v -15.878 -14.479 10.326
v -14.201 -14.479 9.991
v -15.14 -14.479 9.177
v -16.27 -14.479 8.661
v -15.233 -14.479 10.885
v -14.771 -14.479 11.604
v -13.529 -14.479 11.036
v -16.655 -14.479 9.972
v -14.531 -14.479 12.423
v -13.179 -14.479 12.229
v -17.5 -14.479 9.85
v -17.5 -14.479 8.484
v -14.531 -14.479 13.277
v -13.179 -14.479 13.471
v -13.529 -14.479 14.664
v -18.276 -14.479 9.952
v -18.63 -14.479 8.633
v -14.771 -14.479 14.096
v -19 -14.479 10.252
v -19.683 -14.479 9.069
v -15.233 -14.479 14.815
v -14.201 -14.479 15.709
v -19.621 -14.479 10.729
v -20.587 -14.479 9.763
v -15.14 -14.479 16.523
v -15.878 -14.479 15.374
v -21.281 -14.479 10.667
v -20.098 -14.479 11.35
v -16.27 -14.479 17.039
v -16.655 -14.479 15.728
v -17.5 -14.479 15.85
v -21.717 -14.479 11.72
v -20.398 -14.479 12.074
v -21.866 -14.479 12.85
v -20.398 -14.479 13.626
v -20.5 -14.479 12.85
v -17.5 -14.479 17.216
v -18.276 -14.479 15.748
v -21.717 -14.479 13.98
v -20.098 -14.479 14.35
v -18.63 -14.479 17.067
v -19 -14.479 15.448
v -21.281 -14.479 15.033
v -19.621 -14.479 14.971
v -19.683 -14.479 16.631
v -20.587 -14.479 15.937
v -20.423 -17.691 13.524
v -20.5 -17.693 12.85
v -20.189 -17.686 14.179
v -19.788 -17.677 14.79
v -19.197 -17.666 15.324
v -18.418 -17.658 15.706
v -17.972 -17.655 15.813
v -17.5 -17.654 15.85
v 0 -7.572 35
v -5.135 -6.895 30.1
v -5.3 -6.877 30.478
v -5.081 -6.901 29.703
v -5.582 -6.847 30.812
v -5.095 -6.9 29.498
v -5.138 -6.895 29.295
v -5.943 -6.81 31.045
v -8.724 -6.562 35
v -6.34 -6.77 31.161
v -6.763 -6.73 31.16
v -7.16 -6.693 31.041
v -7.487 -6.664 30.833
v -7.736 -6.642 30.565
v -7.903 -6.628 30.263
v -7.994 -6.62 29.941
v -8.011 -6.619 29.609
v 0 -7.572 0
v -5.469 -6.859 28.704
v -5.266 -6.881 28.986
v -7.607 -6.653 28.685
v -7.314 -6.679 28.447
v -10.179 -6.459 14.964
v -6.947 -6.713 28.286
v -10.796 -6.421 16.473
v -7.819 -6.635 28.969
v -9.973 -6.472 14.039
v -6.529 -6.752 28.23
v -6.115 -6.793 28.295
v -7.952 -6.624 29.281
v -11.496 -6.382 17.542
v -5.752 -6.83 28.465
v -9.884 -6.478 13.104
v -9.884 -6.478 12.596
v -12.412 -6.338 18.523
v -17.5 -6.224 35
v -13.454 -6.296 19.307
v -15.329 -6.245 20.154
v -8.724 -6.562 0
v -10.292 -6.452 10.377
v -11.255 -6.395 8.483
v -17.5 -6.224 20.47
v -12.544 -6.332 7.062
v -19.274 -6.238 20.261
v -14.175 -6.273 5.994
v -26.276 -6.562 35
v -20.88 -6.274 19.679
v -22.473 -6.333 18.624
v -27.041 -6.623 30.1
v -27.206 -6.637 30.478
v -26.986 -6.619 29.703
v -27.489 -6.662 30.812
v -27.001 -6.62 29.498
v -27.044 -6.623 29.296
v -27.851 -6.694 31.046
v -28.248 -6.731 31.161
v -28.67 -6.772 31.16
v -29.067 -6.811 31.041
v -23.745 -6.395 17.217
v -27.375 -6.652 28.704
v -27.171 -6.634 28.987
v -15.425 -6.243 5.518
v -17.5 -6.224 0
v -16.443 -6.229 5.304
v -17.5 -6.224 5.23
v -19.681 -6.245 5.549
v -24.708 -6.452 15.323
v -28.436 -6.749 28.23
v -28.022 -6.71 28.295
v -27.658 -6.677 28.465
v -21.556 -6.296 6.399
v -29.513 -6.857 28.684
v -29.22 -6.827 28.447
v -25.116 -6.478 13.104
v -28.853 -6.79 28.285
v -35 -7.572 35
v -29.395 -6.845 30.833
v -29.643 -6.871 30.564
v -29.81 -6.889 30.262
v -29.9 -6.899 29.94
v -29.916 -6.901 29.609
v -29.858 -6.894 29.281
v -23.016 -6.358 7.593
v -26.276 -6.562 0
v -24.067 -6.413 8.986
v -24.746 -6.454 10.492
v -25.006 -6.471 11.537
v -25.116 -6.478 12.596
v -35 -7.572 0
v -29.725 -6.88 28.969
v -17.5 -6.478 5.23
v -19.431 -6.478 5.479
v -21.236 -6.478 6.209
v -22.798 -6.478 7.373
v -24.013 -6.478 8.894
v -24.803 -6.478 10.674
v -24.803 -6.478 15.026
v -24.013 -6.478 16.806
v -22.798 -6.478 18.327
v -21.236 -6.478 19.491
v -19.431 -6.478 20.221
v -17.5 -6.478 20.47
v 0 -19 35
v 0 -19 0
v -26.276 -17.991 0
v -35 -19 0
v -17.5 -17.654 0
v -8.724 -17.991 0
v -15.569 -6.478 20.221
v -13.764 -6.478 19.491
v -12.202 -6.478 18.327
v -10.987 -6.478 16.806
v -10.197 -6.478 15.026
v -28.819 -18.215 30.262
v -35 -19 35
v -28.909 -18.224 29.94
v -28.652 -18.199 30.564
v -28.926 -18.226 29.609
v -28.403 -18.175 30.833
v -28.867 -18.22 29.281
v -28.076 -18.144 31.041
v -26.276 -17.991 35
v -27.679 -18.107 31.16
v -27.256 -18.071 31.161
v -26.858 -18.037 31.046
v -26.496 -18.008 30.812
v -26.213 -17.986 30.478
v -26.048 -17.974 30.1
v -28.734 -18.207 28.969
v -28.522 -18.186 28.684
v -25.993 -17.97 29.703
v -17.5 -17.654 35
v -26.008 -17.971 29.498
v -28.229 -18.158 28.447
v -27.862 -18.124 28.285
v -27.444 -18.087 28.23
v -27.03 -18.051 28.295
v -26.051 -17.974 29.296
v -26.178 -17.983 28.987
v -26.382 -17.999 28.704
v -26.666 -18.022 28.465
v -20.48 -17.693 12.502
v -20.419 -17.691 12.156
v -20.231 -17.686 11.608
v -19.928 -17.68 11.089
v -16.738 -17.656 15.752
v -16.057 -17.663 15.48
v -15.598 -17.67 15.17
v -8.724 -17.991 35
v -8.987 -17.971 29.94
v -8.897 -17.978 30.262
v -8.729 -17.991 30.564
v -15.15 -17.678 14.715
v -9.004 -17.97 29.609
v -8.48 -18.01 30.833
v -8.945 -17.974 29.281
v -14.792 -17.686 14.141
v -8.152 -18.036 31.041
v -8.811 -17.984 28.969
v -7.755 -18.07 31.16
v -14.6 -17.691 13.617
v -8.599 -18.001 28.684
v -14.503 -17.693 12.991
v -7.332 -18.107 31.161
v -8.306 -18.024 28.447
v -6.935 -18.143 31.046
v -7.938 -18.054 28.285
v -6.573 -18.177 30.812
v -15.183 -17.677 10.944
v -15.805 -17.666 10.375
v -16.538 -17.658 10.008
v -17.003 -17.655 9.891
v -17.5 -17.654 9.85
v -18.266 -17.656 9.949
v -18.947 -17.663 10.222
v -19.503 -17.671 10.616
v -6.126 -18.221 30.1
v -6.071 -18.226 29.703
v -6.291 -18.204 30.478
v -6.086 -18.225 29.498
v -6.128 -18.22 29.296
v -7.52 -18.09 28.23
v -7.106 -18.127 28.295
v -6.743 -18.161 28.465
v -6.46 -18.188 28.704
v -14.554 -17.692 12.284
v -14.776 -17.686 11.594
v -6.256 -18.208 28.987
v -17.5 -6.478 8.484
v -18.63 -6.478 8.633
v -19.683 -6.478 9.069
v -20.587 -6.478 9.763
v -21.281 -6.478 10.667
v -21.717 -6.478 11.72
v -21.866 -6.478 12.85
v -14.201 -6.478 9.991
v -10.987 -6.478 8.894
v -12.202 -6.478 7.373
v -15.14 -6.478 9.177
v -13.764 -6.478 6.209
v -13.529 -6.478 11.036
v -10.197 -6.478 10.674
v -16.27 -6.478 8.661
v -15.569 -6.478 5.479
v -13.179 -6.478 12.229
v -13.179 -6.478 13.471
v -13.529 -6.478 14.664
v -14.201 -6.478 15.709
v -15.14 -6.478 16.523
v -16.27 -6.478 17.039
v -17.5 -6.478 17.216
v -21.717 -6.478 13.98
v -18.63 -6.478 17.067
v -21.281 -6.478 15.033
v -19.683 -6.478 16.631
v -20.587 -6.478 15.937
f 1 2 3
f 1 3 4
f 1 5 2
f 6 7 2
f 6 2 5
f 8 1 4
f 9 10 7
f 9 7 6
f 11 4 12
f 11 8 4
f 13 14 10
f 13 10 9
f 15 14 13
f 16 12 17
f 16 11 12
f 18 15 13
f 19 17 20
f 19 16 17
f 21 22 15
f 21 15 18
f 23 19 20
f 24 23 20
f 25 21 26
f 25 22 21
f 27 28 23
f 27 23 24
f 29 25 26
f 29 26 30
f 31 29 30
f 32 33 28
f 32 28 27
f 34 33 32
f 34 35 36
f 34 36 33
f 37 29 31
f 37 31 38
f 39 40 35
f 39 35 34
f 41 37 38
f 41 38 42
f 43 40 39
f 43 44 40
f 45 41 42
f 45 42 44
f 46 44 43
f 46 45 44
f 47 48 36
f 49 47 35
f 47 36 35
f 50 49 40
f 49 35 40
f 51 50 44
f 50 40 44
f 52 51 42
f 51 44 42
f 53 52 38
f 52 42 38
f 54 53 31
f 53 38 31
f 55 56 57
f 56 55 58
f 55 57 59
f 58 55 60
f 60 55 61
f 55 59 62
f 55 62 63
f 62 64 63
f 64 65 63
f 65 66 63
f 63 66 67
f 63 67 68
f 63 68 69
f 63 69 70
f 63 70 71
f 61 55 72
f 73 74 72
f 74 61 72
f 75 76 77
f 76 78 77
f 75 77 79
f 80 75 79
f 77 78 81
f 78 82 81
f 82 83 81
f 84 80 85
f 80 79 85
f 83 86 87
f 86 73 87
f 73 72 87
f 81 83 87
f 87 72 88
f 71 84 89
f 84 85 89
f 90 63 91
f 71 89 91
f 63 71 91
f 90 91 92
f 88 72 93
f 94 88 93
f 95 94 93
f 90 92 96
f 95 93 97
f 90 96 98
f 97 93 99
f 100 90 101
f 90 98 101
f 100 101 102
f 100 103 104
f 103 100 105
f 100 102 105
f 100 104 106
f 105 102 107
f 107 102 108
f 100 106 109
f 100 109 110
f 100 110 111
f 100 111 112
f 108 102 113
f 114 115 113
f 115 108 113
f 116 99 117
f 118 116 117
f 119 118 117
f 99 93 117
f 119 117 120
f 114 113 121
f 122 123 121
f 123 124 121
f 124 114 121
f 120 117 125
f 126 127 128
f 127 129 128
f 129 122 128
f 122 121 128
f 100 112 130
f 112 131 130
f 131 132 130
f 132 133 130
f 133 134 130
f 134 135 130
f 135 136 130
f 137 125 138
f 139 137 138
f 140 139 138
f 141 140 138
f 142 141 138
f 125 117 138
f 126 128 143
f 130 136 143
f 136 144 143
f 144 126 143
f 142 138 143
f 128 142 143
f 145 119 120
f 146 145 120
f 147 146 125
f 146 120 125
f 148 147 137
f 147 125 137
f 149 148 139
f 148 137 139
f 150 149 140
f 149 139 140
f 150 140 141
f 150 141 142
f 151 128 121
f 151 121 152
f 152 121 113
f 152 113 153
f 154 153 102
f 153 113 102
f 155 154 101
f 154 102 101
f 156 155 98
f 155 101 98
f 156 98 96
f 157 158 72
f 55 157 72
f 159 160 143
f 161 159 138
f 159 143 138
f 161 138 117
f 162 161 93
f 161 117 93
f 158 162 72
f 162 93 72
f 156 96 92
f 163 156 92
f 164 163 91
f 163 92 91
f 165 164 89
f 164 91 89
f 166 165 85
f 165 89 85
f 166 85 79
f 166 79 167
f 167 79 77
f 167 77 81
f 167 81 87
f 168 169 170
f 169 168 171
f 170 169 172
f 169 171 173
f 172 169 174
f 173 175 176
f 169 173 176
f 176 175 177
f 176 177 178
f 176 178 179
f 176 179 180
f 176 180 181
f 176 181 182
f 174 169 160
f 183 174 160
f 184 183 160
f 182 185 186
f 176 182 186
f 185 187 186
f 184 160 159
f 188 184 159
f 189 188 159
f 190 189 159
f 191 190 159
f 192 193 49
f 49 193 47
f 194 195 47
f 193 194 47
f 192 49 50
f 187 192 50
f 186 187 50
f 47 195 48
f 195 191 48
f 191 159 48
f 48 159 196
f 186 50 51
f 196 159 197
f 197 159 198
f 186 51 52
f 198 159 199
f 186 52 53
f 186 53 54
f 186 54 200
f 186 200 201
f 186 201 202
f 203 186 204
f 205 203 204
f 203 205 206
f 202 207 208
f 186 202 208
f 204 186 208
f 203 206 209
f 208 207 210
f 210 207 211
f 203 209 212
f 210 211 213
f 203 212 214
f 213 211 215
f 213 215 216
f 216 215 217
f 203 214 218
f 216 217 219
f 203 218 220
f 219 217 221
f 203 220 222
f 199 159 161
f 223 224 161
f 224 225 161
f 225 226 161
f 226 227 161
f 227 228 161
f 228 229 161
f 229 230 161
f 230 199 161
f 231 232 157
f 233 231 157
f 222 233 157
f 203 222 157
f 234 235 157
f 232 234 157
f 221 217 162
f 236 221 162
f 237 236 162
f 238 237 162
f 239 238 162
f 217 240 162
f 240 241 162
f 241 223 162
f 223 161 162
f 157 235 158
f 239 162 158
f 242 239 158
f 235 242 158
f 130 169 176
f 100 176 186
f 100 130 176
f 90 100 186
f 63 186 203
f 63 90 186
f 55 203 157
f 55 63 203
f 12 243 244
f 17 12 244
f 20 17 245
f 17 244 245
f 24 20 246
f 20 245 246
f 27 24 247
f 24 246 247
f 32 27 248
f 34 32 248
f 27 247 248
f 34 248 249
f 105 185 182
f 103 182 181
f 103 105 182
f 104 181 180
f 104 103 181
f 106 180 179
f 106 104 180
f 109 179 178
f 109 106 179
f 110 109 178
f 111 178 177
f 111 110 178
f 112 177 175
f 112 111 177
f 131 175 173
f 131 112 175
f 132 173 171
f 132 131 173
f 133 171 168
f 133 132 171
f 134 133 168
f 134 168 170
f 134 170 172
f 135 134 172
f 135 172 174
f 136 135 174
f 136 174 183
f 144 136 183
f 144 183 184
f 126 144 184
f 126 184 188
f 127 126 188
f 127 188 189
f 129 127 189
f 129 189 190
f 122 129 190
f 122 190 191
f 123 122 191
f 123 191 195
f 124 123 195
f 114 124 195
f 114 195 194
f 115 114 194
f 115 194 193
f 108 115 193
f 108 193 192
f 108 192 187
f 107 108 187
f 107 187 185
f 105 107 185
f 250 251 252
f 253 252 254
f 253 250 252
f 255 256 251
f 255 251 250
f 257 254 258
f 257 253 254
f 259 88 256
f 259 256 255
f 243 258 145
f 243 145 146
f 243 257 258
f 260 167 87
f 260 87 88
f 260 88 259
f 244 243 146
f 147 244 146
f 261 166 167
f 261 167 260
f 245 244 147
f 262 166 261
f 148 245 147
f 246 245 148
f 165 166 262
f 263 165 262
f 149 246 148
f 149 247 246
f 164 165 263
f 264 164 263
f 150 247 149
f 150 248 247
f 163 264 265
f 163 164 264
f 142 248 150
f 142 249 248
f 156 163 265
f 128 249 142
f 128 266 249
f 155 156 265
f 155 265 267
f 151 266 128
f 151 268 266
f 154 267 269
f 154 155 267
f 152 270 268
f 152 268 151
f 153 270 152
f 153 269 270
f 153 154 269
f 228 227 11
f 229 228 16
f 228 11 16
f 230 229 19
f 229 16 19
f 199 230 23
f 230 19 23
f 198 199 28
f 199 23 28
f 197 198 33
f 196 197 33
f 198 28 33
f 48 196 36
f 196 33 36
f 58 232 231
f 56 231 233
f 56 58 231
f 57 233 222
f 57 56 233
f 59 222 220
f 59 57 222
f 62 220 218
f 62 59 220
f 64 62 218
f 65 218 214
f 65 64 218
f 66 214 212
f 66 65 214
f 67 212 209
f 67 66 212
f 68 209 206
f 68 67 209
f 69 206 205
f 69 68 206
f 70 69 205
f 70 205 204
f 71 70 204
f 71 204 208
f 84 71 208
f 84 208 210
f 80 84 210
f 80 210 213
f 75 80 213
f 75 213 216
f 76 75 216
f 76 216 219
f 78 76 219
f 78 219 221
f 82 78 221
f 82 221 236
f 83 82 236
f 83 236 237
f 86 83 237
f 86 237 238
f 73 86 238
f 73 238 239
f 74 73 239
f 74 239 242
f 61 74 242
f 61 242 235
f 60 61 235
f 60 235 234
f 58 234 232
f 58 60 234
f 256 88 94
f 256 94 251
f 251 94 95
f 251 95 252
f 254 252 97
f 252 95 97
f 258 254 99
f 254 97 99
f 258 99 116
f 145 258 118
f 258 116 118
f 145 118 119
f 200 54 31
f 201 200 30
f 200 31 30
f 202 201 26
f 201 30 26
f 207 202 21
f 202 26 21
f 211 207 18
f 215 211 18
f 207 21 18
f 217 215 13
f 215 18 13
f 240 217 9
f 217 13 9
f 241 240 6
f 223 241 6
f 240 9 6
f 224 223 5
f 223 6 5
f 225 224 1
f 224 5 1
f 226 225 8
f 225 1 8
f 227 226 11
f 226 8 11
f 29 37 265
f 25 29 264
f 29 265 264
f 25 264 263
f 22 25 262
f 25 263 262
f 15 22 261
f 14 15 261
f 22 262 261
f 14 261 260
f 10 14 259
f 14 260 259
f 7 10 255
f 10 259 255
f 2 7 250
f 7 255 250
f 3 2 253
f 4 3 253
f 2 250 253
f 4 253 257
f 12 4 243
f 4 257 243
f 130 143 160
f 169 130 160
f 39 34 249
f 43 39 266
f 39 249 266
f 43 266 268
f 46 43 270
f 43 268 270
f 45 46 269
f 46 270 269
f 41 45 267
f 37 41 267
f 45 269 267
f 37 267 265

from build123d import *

# Parameters (mm, degrees)
BOSS_EXTRUDE1_DEPTH     = 35
CUT_EXTRUDE4_DEPTH      = 52.815716631
CUT_EXTRUDE4_DEPTH_BACK = 52.815716631
SKETCH6_R               = 1.4732
CUT_EXTRUDE5_DEPTH      = 53.815781867
CUT_EXTRUDE5_DEPTH_BACK = 53.815781867
SKETCH7_R               = 1.4732
CUT_EXTRUDE6_DEPTH      = 54.018864735
SKETCH9_R               = 3
CUT_EXTRUDE7_DEPTH      = 42.163897972
SKETCH9_3_R             = 4.365625
SKETCH9_3_R_2           = 3
CUT_EXTRUDE8_DEPTH      = 8.255
SKETCH9_4_R             = 7.62
SKETCH9_4_R_2           = 4.365625
CUT_EXTRUDE9_DEPTH      = 0.254


with BuildPart() as part:
    # Sketch1 → Boss-Extrude1 (new body)
    with BuildSketch(Plane.XY):
        with BuildLine():
            Line((0, -19), (0, 0))
            Line((0, 0), (-35, 0))
            Line((-35, 0), (-35, -19))
            ThreePointArc((-35, -19), (-17.5, -17.653892856), (0, -19))
        make_face()
    extrude(amount=BOSS_EXTRUDE1_DEPTH)

    # Sketch6 → Cut-Extrude4 (cut, two sides: drawn at the far end of the back side and taken through both)
    with BuildSketch(Plane(origin=(-1.62776516, -18.605440918, 0), x_dir=(0.9961946980917455, -0.08715574274765824, 0), z_dir=(-0.08715574274765824, -0.9961946980917455, 0)).offset(-CUT_EXTRUDE4_DEPTH_BACK)):
        with Locations((-5.932999587, 29.70276)):
            Circle(SKETCH6_R)
    extrude(amount=CUT_EXTRUDE4_DEPTH + CUT_EXTRUDE4_DEPTH_BACK, mode=Mode.SUBTRACT)

    # Sketch7 → Cut-Extrude5 (cut, two sides: drawn at the far end of the back side and taken through both)
    with BuildSketch(Plane(origin=(1.361900838, -15.566597809, 0), x_dir=(0.9961946980917455, 0.08715574274765851, 0), z_dir=(0.08715574274765851, -0.9961946980917455, 0)).offset(-CUT_EXTRUDE5_DEPTH_BACK)):
        with Locations((-28.933814846, 29.70276)):
            Circle(SKETCH7_R)
    extrude(amount=CUT_EXTRUDE5_DEPTH + CUT_EXTRUDE5_DEPTH_BACK, mode=Mode.SUBTRACT)

    # Sketch8 → Cut-Extrude6 (cut, through all)
    with BuildSketch(Plane(origin=(0, 0, 0), x_dir=(-1, 0, 0), z_dir=(0, 0, -1))):
        with BuildLine():
            ThreePointArc((0, -7.571999996), (17.5, -6.224379342), (35, -7.571999996))
            Line((35, -7.571999996), (35, 0))
            Line((35, 0), (0, 0))
            Line((0, 0), (0, -7.571999996))
        make_face()
    extrude(amount=-CUT_EXTRUDE6_DEPTH, mode=Mode.SUBTRACT)

    # Sketch9 → Cut-Extrude7 (cut, through all)
    with BuildSketch(Plane(origin=(-17.5, -6.224379342, 0), x_dir=(-1, 0, 0), z_dir=(0, 1, 0))):
        with Locations((0, 12.85)):
            Circle(SKETCH9_R)
    extrude(amount=-CUT_EXTRUDE7_DEPTH, mode=Mode.SUBTRACT)

    # Sketch9<3> → Cut-Extrude8 (cut)
    with BuildSketch(Plane(origin=(-17.5, -6.224379342, 0), x_dir=(-1, 0, 0), z_dir=(0, 1, 0))):
        with Locations((0, 12.85)):
            Circle(SKETCH9_3_R)
        with Locations((0, 12.85)):
            Circle(SKETCH9_3_R_2, mode=Mode.SUBTRACT)
    extrude(amount=-CUT_EXTRUDE8_DEPTH, mode=Mode.SUBTRACT)

    # Sketch9<4> → Cut-Extrude9 (cut)
    with BuildSketch(Plane(origin=(-17.5, -6.224379342, 0), x_dir=(-1, 0, 0), z_dir=(0, 1, 0))):
        with Locations((0, 12.85)):
            Circle(SKETCH9_4_R)
        with Locations((0, 12.85)):
            Circle(SKETCH9_4_R_2, mode=Mode.SUBTRACT)
    extrude(amount=-CUT_EXTRUDE9_DEPTH, mode=Mode.SUBTRACT)


solid = part.part
